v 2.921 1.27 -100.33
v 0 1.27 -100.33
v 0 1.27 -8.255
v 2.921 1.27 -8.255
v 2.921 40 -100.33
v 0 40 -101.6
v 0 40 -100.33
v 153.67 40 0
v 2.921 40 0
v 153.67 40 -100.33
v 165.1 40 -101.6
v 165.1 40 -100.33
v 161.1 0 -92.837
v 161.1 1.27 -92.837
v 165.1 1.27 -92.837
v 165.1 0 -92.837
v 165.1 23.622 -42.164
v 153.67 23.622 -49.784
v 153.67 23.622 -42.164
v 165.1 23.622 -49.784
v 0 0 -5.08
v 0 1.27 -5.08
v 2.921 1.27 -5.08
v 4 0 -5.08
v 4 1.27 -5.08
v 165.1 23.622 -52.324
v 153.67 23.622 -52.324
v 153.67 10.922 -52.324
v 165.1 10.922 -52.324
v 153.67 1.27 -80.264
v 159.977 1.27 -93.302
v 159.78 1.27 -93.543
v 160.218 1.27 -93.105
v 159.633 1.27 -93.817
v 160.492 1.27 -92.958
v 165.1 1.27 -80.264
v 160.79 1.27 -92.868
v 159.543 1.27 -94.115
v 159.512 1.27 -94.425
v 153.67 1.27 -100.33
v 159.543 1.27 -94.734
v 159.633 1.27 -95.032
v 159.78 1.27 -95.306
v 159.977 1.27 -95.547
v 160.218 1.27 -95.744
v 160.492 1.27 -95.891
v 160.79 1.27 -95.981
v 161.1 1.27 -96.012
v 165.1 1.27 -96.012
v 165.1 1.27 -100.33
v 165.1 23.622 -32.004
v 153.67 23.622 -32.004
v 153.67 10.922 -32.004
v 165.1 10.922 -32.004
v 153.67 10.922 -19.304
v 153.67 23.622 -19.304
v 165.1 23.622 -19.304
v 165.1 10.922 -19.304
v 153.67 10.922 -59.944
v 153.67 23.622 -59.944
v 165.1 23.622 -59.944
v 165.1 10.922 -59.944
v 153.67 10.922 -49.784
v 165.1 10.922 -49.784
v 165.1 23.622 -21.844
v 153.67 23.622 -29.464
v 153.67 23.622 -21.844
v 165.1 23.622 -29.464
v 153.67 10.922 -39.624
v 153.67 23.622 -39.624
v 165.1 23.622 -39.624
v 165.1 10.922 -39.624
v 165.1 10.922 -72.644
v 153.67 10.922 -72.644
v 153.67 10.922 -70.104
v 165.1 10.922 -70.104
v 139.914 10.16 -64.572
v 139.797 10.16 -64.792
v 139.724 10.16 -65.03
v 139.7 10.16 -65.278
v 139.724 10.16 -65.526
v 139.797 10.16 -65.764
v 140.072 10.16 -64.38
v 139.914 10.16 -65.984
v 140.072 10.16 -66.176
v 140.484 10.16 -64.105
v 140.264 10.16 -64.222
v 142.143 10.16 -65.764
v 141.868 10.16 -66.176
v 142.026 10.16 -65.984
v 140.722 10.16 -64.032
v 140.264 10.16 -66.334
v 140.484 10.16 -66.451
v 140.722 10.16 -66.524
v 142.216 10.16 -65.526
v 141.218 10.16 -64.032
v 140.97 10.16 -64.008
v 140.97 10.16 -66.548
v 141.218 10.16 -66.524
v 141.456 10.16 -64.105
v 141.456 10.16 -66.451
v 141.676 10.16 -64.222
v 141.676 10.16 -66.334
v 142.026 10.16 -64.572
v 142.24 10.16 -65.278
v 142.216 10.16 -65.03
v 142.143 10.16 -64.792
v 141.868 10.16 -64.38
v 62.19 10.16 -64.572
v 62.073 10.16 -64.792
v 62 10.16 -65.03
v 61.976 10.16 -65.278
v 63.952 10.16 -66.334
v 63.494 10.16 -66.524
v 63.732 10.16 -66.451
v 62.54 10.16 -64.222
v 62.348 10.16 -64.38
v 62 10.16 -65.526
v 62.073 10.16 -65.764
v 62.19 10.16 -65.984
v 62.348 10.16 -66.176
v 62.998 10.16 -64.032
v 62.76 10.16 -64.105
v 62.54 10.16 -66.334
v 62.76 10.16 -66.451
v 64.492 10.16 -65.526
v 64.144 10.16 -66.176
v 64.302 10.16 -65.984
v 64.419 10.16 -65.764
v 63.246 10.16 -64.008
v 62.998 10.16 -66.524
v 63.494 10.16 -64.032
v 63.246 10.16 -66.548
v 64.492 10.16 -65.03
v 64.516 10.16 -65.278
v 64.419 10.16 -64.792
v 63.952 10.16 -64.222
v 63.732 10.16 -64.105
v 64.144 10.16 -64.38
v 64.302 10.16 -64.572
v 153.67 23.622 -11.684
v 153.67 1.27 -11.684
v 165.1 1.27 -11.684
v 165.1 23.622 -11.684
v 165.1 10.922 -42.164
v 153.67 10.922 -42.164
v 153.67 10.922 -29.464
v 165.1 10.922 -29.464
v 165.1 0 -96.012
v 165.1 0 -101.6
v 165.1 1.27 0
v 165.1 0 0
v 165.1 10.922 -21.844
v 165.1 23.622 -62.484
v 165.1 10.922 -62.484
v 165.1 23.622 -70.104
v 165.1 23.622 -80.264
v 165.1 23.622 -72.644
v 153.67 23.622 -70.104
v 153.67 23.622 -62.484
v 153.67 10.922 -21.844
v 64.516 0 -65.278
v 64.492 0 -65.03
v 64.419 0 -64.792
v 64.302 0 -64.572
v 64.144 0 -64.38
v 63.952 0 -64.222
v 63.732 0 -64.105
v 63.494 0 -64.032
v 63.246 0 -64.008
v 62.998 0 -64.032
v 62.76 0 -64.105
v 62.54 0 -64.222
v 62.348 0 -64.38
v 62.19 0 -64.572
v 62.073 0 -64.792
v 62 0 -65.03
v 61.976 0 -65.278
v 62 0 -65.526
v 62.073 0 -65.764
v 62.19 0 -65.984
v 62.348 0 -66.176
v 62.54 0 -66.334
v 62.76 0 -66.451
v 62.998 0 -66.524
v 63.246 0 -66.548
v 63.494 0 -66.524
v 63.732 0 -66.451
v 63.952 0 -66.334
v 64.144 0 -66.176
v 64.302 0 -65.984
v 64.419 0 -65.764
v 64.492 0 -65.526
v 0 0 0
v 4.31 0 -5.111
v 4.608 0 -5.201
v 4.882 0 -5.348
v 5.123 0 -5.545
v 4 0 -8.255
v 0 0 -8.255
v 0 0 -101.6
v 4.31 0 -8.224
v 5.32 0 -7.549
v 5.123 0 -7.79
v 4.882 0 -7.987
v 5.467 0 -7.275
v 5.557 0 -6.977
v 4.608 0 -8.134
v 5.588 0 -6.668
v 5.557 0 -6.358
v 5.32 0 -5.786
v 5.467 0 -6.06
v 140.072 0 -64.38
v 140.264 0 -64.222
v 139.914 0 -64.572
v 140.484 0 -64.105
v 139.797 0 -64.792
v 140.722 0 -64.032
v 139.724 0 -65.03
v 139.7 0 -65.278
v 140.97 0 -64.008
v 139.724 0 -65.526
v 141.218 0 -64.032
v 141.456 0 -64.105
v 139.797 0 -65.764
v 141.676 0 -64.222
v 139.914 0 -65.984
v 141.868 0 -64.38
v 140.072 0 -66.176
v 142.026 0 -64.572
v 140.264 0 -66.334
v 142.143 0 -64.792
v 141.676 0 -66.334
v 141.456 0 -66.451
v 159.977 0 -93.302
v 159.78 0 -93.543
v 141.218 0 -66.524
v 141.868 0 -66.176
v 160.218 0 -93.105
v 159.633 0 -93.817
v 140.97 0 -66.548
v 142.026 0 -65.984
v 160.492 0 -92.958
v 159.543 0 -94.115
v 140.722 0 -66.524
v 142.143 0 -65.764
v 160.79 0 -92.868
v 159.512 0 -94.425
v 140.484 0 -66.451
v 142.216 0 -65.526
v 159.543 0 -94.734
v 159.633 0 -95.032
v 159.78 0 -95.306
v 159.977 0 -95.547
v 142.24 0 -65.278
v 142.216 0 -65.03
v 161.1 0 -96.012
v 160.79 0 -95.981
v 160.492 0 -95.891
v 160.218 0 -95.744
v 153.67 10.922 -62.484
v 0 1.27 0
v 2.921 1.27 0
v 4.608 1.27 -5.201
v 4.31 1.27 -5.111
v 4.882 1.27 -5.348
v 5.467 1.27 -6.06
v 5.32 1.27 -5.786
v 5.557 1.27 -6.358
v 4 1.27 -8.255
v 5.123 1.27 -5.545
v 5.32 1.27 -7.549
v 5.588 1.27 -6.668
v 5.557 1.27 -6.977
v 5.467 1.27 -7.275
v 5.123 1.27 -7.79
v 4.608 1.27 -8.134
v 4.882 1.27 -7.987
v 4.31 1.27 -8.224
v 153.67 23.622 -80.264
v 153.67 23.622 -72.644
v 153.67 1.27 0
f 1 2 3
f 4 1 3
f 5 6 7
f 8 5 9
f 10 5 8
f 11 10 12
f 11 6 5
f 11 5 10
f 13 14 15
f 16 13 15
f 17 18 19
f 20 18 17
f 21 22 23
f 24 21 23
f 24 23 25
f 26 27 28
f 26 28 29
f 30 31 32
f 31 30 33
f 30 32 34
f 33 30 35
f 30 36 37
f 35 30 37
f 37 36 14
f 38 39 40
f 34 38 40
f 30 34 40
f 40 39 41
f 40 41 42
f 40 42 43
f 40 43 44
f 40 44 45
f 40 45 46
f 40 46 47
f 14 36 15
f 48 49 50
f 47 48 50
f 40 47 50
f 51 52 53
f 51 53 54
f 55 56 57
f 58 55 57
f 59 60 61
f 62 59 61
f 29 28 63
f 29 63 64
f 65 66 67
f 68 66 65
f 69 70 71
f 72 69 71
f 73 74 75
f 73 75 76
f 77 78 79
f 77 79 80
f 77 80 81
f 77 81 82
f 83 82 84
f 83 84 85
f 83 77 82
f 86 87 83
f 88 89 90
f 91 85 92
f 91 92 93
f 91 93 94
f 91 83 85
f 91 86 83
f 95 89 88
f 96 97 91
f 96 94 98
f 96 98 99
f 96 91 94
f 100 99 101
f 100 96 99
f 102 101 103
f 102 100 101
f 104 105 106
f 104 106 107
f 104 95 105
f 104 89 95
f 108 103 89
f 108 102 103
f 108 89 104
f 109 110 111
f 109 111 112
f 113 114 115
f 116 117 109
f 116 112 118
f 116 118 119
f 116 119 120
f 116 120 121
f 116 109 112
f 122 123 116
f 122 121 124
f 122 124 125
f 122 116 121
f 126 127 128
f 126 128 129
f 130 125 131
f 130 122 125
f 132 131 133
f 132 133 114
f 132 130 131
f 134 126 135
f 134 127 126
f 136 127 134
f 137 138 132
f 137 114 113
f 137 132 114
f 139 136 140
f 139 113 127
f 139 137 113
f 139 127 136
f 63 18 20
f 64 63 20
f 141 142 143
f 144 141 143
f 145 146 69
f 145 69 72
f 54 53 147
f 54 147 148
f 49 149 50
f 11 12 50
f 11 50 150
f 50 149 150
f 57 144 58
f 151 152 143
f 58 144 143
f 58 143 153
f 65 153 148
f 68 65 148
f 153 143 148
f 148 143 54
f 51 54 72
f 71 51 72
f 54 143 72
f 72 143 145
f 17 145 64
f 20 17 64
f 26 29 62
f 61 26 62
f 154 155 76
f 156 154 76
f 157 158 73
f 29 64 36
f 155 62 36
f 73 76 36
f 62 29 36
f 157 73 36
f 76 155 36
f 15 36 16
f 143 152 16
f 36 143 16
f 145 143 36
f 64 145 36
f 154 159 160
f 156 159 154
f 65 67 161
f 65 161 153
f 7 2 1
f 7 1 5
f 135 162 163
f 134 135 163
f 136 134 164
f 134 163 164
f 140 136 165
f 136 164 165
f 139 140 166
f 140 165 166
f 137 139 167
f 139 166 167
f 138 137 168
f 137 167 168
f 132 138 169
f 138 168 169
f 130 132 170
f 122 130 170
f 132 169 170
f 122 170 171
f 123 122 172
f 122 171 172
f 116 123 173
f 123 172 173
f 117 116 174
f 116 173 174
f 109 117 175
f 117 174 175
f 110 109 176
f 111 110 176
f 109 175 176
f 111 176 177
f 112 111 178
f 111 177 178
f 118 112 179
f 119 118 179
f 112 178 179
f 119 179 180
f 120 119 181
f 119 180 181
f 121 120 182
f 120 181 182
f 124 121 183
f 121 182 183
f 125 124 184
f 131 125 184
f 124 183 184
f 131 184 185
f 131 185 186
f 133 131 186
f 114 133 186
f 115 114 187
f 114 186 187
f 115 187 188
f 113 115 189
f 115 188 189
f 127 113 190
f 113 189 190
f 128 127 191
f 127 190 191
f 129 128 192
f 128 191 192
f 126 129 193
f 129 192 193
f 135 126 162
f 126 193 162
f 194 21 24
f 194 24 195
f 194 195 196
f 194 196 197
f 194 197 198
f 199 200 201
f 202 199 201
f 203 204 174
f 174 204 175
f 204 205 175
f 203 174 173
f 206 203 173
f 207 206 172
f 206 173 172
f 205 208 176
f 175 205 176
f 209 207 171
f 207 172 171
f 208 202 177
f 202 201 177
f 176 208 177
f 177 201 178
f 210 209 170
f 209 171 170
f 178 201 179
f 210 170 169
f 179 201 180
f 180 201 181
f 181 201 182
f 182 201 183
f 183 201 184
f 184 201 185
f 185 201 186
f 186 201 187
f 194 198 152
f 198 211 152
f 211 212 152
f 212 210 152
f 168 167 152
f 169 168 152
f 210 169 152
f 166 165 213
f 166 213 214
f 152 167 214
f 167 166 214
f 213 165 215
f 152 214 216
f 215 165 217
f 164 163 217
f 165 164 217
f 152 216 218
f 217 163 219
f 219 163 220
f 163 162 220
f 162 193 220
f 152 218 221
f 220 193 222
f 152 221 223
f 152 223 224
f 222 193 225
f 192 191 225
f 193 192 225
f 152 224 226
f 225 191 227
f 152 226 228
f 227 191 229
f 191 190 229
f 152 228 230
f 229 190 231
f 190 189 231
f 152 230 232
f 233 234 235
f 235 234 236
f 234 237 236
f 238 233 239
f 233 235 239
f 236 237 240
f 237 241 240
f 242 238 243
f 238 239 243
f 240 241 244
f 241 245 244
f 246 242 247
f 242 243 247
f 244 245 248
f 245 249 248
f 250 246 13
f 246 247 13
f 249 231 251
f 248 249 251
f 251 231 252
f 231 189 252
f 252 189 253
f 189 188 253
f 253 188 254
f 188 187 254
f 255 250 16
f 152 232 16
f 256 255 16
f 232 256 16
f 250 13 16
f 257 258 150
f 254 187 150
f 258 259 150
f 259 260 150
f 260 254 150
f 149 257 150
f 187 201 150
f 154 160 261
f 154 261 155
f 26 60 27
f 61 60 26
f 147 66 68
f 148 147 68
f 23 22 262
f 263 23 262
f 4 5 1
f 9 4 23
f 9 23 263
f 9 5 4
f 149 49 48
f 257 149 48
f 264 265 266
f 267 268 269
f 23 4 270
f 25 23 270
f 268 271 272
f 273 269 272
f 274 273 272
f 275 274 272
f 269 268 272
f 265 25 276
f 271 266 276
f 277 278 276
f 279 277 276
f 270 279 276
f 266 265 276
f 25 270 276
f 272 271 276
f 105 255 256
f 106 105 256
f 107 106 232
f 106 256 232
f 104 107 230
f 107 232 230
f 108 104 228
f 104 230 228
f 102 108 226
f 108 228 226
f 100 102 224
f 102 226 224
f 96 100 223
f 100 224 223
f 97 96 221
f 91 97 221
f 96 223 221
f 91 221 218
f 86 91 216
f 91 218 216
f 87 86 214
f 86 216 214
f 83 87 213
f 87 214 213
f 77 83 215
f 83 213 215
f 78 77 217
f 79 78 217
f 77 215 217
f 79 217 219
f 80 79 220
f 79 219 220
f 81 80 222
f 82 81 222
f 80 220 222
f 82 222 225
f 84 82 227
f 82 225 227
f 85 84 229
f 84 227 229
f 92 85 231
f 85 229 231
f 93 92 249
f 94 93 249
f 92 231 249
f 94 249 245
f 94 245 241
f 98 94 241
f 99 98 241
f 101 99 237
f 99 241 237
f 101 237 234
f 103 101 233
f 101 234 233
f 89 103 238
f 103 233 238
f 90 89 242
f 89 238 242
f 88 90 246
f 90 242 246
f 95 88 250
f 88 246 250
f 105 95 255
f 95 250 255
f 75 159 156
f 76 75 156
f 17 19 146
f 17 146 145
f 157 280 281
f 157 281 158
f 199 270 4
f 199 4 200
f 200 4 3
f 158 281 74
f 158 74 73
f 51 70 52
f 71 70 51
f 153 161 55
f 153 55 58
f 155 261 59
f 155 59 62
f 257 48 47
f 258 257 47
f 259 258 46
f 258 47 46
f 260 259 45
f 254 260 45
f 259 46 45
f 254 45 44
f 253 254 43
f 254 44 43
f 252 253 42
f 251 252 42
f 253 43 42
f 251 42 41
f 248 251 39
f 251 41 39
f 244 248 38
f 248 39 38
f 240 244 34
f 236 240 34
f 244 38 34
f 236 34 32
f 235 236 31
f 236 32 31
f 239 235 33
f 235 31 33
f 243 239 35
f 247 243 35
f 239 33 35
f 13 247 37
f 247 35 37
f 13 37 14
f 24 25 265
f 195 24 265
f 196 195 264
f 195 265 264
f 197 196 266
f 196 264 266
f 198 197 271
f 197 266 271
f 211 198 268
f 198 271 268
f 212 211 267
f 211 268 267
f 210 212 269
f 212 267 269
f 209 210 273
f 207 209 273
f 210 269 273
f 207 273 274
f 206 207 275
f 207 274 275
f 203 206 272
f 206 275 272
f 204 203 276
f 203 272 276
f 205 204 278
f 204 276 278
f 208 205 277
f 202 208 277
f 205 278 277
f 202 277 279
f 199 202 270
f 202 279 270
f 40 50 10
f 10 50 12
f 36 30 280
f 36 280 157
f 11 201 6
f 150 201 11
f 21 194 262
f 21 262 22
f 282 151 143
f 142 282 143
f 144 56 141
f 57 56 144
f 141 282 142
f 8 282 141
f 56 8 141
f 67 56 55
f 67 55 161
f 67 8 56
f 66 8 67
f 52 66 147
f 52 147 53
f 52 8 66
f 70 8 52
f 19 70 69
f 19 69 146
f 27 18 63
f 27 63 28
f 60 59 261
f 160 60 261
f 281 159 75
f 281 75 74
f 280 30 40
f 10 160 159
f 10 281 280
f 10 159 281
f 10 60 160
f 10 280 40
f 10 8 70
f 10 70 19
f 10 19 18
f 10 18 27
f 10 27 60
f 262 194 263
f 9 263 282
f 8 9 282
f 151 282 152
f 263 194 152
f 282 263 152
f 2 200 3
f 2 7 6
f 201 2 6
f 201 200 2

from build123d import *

# Parameters (mm, degrees)
SKETCH1_W           = 165.1
SKETCH1_H           = 101.6
BOSS_EXTRUDE1_DEPTH = 40
SKETCH2_W           = 100.33
SKETCH2_H           = 38.73
CUT_EXTRUDE1_DEPTH  = 11.43
SKETCH3_W           = 100.33
SKETCH3_H           = 38.73
CUT_EXTRUDE2_DEPTH  = 2.921
SKETCH4_W           = 11.43
SKETCH4_H           = 68.58
BOSS_EXTRUDE2_DEPTH = 22.352
CUT_EXTRUDE3_DEPTH  = 22.352
SKETCH6_R           = 1.27
CUT_EXTRUDE4_DEPTH  = 10.16
SKETCH7_W           = 11.43
SKETCH7_H           = 2.54
CUT_EXTRUDE5_DEPTH  = 12.7


with BuildPart() as part:
    # Sketch1 → Boss-Extrude1 (new body)
    with BuildSketch(Plane(origin=(0, 0, 0), x_dir=(1, 0, 0), z_dir=(0, 1, 0))):
        with Locations((82.55, 50.8)):
            Rectangle(SKETCH1_W, SKETCH1_H)
    extrude(amount=BOSS_EXTRUDE1_DEPTH)

    # Sketch2 → Cut-Extrude1 (cut)
    with BuildSketch(Plane(origin=(165.1, 0, 0), x_dir=(0, 0, -1), z_dir=(1, 0, 0))):
        with Locations((50.165, 20.635)):
            Rectangle(SKETCH2_W, SKETCH2_H)
    extrude(amount=-CUT_EXTRUDE1_DEPTH, mode=Mode.SUBTRACT)

    # Sketch3 → Cut-Extrude2 (cut)
    with BuildSketch(Plane.ZY):
        with Locations((-50.165, 20.635)):
            Rectangle(SKETCH3_W, SKETCH3_H)
    extrude(amount=-CUT_EXTRUDE2_DEPTH, mode=Mode.SUBTRACT)

    # Sketch4 → Boss-Extrude2 (add)
    with BuildSketch(Plane(origin=(0, 1.27, 0), x_dir=(1, 0, 0), z_dir=(0, 1, 0))):
        with Locations((159.385, 45.974)):
            Rectangle(SKETCH4_W, SKETCH4_H)
    extrude(amount=BOSS_EXTRUDE2_DEPTH)

    # Sketch5 → Cut-Extrude3 (cut)
    with BuildSketch(Plane(origin=(0, 1.27, 0), x_dir=(1, 0, 0), z_dir=(0, 1, 0))):
        with BuildLine():
            Line((0, 8.255), (0, 5.08))
            Line((0, 5.08), (4.0005, 5.08))
            ThreePointArc((4.0005, 5.08), (5.588, 6.6675), (4.0005, 8.255))
            Line((4.0005, 8.255), (0, 8.255))
        make_face()
        with BuildLine():
            Line((165.1, 92.837), (165.1, 96.012))
            Line((165.1, 96.012), (161.0995, 96.012))
            ThreePointArc((161.0995, 96.012), (159.512, 94.4245), (161.0995, 92.837))
            Line((161.0995, 92.837), (165.1, 92.837))
        make_face()
    extrude(amount=-CUT_EXTRUDE3_DEPTH, mode=Mode.SUBTRACT)

    # Sketch6 → Cut-Extrude4 (cut)
    with BuildSketch(Plane.XZ):
        with Locations((63.246, -65.278)):
            Circle(SKETCH6_R)
        with Locations((140.97, -65.278)):
            Circle(SKETCH6_R)
    extrude(amount=-CUT_EXTRUDE4_DEPTH, mode=Mode.SUBTRACT)

    # Sketch7 → Cut-Extrude5 (cut)
    with BuildSketch(Plane(origin=(0, 23.622, 0), x_dir=(1, 0, 0), z_dir=(0, 1, 0))):
        with Locations((159.385, 71.374)):
            Rectangle(SKETCH7_W, SKETCH7_H)
        with Locations((159.385, 61.214)):
            Rectangle(SKETCH7_W, SKETCH7_H)
        with Locations((159.385, 51.054)):
            Rectangle(SKETCH7_W, SKETCH7_H)
        with Locations((159.385, 40.894)):
            Rectangle(SKETCH7_W, SKETCH7_H)
        with Locations((159.385, 30.734)):
            Rectangle(SKETCH7_W, SKETCH7_H)
        with Locations((159.385, 20.574)):
            Rectangle(SKETCH7_W, SKETCH7_H)
    extrude(amount=-CUT_EXTRUDE5_DEPTH, mode=Mode.SUBTRACT)


solid = part.part
